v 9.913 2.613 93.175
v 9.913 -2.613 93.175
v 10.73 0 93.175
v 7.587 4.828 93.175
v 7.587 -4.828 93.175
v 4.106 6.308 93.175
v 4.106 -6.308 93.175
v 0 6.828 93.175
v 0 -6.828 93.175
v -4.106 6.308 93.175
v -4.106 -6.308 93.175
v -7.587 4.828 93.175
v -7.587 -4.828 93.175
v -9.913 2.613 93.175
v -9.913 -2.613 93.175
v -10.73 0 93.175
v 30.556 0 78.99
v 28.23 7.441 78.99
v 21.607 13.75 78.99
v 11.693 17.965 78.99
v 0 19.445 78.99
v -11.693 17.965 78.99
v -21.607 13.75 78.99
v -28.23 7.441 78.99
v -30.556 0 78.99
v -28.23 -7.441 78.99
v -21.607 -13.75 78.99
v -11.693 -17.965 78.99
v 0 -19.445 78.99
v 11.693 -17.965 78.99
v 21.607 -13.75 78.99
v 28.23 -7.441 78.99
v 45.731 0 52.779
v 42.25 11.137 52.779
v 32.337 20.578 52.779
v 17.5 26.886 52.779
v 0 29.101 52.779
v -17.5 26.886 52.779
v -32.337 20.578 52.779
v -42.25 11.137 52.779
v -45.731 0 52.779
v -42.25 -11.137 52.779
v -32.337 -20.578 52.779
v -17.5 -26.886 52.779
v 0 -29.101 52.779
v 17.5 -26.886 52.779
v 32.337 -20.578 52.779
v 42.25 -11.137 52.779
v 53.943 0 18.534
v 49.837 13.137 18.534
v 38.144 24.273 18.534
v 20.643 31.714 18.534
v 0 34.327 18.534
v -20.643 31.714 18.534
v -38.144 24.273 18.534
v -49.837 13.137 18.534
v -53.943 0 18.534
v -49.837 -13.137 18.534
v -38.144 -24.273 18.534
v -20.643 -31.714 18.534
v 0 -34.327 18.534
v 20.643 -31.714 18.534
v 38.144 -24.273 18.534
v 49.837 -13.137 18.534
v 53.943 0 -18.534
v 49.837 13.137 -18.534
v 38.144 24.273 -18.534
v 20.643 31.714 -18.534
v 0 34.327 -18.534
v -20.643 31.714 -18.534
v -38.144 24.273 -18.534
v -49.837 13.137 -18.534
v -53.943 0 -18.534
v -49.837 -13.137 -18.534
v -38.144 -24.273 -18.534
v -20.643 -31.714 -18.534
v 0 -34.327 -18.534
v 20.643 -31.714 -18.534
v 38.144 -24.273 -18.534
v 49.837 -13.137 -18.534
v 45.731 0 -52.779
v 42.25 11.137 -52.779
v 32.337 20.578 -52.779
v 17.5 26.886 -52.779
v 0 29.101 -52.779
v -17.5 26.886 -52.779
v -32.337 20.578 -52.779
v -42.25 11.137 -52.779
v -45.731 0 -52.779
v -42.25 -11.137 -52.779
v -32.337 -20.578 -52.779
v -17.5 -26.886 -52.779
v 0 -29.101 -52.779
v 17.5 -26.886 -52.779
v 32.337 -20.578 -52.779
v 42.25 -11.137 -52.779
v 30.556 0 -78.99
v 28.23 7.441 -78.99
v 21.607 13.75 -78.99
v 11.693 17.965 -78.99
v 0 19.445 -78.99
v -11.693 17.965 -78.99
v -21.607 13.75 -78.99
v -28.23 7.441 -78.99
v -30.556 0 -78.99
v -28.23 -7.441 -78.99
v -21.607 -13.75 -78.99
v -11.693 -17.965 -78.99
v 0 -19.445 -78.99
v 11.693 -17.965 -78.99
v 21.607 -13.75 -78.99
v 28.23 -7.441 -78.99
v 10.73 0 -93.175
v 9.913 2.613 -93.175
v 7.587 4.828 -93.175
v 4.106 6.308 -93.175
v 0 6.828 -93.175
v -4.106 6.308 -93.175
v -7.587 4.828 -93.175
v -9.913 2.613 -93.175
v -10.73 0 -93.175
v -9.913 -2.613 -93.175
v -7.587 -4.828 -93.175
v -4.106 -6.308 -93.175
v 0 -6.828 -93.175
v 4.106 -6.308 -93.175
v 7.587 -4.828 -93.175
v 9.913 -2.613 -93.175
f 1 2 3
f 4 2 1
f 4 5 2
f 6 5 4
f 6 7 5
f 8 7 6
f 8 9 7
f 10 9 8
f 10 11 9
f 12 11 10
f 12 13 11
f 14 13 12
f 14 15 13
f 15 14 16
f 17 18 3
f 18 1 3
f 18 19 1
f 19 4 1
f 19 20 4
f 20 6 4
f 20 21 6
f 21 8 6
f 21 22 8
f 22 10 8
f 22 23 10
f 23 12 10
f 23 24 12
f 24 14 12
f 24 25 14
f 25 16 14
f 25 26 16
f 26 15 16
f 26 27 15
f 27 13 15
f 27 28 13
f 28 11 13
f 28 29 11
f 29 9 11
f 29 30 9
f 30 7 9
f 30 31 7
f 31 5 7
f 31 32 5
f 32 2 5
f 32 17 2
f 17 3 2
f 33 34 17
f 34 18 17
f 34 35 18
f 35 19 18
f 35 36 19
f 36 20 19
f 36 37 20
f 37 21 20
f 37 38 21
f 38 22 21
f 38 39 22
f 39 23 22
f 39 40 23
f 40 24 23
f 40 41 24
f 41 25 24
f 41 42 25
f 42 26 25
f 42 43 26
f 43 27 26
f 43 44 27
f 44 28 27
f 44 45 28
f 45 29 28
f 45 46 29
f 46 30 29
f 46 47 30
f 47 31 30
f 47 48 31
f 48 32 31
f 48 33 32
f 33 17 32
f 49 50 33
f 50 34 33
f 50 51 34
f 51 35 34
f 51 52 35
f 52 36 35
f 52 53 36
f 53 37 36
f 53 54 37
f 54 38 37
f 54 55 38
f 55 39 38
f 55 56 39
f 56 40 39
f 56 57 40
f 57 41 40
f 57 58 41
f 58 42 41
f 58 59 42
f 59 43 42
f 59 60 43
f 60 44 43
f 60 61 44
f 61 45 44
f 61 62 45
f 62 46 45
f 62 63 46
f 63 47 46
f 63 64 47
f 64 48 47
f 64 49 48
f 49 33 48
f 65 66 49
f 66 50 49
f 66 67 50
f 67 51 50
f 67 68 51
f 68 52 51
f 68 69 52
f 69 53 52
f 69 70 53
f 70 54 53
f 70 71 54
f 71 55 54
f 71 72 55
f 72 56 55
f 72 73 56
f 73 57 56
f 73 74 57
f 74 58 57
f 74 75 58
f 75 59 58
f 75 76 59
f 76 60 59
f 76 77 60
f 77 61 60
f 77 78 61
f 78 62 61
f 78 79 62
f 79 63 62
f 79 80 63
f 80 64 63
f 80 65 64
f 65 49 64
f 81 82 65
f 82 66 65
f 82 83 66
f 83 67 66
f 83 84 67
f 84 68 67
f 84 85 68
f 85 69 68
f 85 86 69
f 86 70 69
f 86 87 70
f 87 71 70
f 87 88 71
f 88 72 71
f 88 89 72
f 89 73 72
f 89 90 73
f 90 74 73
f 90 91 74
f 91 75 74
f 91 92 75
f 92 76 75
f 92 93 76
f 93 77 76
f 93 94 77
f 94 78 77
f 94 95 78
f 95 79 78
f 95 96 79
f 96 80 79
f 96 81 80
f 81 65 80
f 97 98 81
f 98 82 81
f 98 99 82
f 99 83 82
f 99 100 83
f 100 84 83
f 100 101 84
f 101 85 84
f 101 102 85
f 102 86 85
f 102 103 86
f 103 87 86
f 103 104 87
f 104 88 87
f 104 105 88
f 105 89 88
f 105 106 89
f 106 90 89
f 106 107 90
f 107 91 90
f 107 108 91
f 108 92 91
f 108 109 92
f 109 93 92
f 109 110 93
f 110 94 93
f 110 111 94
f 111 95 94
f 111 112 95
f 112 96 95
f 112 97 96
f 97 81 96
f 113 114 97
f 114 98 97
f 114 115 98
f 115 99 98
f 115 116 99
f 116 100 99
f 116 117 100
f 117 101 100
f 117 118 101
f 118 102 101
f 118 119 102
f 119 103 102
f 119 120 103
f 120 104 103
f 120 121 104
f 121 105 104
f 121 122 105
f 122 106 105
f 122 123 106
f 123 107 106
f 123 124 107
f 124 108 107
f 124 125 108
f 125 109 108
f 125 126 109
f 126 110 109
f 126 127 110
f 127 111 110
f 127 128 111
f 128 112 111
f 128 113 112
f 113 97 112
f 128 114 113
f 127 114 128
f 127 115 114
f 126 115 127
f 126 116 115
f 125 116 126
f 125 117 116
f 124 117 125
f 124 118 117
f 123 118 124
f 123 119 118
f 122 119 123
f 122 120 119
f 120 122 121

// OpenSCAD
// Generated by SolidPython 1.0.1 on 2020-07-29 00:46:49


scale(v = [11, 7, 19]) {
	sphere(r = 5);
}
/***********************************************
*********      SolidPython code:      **********
************************************************
 
# import packages: SolidPython
from solid import *
from solid.utils import *
from itertools import chain, combinations, permutations


class Resize:

    def __init__(self, scad_file):
        self.scad_file = scad_file
        #self.scad_file = import_scad(scad_file)
        # cone/cylinder param:
        self.r1 = 0
        self.r2 = 0
        self.h = 0
        # rectangular prism param:
        self.w = 0
        self.l = 0
        # ellipse param:
        self.r = 0

    # import OpenScad code (file name corresponds to shape)


    # classify shape + parameters
    def assign(self, param1, param2, param3):
        if self.scad_file == 'cone.scad':
            self.r1 = param1
            self.r2 = param2
            self.h = param3
        elif self.scad_file == 'cylinder.scad':
            self.r1 = param1
            self.r2 = param2
            self.h = param3
        elif self.scad_file == 'rectangularPrism.scad':
            self.h = param1
            self.l = param2
            self.w = param3
        else:
            self.r = param1
            self.h = param2

    # resize parameters
    def iterate(self):
        x = range(3, 20, 2)
        i = 1
        if self.scad_file == 'cone.scad':
            tempList = list(permutations(x, 2))
            for temp in tempList:
                param1 = temp[0]
                param2 = temp[1]
                filepath = 'produced_scad_files/' + 'cone' + str(param1) + '_' + str(param2) + '_' + '.scad'
                scad_render_to_file(cylinder(h=param1, r1=param2, r2=0), filepath)

        elif self.scad_file == 'cylinder.scad':
            tempList = list(permutations(x, 3))
            for temp in tempList:
                param1 = temp[0]
                param2 = temp[1]
                filepath = 'produced_scad_files/' + 'cylinder' + str(param1) + '_' + str(param2) + '_' + '.scad'
                scad_render_to_file(cylinder(h=param1, r1=param2, r2=param2), filepath)

        elif self.scad_file == 'rectangularPrism.scad':
            tempList = list(permutations(x, 3))
            for temp in tempList:
                param1 = temp[0]
                param2 = temp[1]
                param3 = temp[2]
                filepath = 'produced_scad_files/' + 'rectangularPrism' + str(param1) + '_' + str(param2) + '_' + str(
                    param3) + '.scad'
                scad_render_to_file(cube(size=(param1, param2, param3)), filepath)

        elif self.scad_file == 'ellipse.scad':
            tempList = list(permutations(x, 4))
            for temp in tempList:
                param1 = temp[0]
                param2 = temp[1]
                param3 = temp[2]
                param4 = temp[3]
                filepath = 'produced_scad_files/' + 'ellipse' + str(param1) + '_' + str(param2) + '_' + str(param3) + '_' + str(param4) + '.scad'
                scad_render_to_file(scale([param1, param2, param3])(sphere(r=param4)), filepath)

    def render_to_scadfile(self):
        scad_render_to_file(scad, 'example.scad') 
 
************************************************/
